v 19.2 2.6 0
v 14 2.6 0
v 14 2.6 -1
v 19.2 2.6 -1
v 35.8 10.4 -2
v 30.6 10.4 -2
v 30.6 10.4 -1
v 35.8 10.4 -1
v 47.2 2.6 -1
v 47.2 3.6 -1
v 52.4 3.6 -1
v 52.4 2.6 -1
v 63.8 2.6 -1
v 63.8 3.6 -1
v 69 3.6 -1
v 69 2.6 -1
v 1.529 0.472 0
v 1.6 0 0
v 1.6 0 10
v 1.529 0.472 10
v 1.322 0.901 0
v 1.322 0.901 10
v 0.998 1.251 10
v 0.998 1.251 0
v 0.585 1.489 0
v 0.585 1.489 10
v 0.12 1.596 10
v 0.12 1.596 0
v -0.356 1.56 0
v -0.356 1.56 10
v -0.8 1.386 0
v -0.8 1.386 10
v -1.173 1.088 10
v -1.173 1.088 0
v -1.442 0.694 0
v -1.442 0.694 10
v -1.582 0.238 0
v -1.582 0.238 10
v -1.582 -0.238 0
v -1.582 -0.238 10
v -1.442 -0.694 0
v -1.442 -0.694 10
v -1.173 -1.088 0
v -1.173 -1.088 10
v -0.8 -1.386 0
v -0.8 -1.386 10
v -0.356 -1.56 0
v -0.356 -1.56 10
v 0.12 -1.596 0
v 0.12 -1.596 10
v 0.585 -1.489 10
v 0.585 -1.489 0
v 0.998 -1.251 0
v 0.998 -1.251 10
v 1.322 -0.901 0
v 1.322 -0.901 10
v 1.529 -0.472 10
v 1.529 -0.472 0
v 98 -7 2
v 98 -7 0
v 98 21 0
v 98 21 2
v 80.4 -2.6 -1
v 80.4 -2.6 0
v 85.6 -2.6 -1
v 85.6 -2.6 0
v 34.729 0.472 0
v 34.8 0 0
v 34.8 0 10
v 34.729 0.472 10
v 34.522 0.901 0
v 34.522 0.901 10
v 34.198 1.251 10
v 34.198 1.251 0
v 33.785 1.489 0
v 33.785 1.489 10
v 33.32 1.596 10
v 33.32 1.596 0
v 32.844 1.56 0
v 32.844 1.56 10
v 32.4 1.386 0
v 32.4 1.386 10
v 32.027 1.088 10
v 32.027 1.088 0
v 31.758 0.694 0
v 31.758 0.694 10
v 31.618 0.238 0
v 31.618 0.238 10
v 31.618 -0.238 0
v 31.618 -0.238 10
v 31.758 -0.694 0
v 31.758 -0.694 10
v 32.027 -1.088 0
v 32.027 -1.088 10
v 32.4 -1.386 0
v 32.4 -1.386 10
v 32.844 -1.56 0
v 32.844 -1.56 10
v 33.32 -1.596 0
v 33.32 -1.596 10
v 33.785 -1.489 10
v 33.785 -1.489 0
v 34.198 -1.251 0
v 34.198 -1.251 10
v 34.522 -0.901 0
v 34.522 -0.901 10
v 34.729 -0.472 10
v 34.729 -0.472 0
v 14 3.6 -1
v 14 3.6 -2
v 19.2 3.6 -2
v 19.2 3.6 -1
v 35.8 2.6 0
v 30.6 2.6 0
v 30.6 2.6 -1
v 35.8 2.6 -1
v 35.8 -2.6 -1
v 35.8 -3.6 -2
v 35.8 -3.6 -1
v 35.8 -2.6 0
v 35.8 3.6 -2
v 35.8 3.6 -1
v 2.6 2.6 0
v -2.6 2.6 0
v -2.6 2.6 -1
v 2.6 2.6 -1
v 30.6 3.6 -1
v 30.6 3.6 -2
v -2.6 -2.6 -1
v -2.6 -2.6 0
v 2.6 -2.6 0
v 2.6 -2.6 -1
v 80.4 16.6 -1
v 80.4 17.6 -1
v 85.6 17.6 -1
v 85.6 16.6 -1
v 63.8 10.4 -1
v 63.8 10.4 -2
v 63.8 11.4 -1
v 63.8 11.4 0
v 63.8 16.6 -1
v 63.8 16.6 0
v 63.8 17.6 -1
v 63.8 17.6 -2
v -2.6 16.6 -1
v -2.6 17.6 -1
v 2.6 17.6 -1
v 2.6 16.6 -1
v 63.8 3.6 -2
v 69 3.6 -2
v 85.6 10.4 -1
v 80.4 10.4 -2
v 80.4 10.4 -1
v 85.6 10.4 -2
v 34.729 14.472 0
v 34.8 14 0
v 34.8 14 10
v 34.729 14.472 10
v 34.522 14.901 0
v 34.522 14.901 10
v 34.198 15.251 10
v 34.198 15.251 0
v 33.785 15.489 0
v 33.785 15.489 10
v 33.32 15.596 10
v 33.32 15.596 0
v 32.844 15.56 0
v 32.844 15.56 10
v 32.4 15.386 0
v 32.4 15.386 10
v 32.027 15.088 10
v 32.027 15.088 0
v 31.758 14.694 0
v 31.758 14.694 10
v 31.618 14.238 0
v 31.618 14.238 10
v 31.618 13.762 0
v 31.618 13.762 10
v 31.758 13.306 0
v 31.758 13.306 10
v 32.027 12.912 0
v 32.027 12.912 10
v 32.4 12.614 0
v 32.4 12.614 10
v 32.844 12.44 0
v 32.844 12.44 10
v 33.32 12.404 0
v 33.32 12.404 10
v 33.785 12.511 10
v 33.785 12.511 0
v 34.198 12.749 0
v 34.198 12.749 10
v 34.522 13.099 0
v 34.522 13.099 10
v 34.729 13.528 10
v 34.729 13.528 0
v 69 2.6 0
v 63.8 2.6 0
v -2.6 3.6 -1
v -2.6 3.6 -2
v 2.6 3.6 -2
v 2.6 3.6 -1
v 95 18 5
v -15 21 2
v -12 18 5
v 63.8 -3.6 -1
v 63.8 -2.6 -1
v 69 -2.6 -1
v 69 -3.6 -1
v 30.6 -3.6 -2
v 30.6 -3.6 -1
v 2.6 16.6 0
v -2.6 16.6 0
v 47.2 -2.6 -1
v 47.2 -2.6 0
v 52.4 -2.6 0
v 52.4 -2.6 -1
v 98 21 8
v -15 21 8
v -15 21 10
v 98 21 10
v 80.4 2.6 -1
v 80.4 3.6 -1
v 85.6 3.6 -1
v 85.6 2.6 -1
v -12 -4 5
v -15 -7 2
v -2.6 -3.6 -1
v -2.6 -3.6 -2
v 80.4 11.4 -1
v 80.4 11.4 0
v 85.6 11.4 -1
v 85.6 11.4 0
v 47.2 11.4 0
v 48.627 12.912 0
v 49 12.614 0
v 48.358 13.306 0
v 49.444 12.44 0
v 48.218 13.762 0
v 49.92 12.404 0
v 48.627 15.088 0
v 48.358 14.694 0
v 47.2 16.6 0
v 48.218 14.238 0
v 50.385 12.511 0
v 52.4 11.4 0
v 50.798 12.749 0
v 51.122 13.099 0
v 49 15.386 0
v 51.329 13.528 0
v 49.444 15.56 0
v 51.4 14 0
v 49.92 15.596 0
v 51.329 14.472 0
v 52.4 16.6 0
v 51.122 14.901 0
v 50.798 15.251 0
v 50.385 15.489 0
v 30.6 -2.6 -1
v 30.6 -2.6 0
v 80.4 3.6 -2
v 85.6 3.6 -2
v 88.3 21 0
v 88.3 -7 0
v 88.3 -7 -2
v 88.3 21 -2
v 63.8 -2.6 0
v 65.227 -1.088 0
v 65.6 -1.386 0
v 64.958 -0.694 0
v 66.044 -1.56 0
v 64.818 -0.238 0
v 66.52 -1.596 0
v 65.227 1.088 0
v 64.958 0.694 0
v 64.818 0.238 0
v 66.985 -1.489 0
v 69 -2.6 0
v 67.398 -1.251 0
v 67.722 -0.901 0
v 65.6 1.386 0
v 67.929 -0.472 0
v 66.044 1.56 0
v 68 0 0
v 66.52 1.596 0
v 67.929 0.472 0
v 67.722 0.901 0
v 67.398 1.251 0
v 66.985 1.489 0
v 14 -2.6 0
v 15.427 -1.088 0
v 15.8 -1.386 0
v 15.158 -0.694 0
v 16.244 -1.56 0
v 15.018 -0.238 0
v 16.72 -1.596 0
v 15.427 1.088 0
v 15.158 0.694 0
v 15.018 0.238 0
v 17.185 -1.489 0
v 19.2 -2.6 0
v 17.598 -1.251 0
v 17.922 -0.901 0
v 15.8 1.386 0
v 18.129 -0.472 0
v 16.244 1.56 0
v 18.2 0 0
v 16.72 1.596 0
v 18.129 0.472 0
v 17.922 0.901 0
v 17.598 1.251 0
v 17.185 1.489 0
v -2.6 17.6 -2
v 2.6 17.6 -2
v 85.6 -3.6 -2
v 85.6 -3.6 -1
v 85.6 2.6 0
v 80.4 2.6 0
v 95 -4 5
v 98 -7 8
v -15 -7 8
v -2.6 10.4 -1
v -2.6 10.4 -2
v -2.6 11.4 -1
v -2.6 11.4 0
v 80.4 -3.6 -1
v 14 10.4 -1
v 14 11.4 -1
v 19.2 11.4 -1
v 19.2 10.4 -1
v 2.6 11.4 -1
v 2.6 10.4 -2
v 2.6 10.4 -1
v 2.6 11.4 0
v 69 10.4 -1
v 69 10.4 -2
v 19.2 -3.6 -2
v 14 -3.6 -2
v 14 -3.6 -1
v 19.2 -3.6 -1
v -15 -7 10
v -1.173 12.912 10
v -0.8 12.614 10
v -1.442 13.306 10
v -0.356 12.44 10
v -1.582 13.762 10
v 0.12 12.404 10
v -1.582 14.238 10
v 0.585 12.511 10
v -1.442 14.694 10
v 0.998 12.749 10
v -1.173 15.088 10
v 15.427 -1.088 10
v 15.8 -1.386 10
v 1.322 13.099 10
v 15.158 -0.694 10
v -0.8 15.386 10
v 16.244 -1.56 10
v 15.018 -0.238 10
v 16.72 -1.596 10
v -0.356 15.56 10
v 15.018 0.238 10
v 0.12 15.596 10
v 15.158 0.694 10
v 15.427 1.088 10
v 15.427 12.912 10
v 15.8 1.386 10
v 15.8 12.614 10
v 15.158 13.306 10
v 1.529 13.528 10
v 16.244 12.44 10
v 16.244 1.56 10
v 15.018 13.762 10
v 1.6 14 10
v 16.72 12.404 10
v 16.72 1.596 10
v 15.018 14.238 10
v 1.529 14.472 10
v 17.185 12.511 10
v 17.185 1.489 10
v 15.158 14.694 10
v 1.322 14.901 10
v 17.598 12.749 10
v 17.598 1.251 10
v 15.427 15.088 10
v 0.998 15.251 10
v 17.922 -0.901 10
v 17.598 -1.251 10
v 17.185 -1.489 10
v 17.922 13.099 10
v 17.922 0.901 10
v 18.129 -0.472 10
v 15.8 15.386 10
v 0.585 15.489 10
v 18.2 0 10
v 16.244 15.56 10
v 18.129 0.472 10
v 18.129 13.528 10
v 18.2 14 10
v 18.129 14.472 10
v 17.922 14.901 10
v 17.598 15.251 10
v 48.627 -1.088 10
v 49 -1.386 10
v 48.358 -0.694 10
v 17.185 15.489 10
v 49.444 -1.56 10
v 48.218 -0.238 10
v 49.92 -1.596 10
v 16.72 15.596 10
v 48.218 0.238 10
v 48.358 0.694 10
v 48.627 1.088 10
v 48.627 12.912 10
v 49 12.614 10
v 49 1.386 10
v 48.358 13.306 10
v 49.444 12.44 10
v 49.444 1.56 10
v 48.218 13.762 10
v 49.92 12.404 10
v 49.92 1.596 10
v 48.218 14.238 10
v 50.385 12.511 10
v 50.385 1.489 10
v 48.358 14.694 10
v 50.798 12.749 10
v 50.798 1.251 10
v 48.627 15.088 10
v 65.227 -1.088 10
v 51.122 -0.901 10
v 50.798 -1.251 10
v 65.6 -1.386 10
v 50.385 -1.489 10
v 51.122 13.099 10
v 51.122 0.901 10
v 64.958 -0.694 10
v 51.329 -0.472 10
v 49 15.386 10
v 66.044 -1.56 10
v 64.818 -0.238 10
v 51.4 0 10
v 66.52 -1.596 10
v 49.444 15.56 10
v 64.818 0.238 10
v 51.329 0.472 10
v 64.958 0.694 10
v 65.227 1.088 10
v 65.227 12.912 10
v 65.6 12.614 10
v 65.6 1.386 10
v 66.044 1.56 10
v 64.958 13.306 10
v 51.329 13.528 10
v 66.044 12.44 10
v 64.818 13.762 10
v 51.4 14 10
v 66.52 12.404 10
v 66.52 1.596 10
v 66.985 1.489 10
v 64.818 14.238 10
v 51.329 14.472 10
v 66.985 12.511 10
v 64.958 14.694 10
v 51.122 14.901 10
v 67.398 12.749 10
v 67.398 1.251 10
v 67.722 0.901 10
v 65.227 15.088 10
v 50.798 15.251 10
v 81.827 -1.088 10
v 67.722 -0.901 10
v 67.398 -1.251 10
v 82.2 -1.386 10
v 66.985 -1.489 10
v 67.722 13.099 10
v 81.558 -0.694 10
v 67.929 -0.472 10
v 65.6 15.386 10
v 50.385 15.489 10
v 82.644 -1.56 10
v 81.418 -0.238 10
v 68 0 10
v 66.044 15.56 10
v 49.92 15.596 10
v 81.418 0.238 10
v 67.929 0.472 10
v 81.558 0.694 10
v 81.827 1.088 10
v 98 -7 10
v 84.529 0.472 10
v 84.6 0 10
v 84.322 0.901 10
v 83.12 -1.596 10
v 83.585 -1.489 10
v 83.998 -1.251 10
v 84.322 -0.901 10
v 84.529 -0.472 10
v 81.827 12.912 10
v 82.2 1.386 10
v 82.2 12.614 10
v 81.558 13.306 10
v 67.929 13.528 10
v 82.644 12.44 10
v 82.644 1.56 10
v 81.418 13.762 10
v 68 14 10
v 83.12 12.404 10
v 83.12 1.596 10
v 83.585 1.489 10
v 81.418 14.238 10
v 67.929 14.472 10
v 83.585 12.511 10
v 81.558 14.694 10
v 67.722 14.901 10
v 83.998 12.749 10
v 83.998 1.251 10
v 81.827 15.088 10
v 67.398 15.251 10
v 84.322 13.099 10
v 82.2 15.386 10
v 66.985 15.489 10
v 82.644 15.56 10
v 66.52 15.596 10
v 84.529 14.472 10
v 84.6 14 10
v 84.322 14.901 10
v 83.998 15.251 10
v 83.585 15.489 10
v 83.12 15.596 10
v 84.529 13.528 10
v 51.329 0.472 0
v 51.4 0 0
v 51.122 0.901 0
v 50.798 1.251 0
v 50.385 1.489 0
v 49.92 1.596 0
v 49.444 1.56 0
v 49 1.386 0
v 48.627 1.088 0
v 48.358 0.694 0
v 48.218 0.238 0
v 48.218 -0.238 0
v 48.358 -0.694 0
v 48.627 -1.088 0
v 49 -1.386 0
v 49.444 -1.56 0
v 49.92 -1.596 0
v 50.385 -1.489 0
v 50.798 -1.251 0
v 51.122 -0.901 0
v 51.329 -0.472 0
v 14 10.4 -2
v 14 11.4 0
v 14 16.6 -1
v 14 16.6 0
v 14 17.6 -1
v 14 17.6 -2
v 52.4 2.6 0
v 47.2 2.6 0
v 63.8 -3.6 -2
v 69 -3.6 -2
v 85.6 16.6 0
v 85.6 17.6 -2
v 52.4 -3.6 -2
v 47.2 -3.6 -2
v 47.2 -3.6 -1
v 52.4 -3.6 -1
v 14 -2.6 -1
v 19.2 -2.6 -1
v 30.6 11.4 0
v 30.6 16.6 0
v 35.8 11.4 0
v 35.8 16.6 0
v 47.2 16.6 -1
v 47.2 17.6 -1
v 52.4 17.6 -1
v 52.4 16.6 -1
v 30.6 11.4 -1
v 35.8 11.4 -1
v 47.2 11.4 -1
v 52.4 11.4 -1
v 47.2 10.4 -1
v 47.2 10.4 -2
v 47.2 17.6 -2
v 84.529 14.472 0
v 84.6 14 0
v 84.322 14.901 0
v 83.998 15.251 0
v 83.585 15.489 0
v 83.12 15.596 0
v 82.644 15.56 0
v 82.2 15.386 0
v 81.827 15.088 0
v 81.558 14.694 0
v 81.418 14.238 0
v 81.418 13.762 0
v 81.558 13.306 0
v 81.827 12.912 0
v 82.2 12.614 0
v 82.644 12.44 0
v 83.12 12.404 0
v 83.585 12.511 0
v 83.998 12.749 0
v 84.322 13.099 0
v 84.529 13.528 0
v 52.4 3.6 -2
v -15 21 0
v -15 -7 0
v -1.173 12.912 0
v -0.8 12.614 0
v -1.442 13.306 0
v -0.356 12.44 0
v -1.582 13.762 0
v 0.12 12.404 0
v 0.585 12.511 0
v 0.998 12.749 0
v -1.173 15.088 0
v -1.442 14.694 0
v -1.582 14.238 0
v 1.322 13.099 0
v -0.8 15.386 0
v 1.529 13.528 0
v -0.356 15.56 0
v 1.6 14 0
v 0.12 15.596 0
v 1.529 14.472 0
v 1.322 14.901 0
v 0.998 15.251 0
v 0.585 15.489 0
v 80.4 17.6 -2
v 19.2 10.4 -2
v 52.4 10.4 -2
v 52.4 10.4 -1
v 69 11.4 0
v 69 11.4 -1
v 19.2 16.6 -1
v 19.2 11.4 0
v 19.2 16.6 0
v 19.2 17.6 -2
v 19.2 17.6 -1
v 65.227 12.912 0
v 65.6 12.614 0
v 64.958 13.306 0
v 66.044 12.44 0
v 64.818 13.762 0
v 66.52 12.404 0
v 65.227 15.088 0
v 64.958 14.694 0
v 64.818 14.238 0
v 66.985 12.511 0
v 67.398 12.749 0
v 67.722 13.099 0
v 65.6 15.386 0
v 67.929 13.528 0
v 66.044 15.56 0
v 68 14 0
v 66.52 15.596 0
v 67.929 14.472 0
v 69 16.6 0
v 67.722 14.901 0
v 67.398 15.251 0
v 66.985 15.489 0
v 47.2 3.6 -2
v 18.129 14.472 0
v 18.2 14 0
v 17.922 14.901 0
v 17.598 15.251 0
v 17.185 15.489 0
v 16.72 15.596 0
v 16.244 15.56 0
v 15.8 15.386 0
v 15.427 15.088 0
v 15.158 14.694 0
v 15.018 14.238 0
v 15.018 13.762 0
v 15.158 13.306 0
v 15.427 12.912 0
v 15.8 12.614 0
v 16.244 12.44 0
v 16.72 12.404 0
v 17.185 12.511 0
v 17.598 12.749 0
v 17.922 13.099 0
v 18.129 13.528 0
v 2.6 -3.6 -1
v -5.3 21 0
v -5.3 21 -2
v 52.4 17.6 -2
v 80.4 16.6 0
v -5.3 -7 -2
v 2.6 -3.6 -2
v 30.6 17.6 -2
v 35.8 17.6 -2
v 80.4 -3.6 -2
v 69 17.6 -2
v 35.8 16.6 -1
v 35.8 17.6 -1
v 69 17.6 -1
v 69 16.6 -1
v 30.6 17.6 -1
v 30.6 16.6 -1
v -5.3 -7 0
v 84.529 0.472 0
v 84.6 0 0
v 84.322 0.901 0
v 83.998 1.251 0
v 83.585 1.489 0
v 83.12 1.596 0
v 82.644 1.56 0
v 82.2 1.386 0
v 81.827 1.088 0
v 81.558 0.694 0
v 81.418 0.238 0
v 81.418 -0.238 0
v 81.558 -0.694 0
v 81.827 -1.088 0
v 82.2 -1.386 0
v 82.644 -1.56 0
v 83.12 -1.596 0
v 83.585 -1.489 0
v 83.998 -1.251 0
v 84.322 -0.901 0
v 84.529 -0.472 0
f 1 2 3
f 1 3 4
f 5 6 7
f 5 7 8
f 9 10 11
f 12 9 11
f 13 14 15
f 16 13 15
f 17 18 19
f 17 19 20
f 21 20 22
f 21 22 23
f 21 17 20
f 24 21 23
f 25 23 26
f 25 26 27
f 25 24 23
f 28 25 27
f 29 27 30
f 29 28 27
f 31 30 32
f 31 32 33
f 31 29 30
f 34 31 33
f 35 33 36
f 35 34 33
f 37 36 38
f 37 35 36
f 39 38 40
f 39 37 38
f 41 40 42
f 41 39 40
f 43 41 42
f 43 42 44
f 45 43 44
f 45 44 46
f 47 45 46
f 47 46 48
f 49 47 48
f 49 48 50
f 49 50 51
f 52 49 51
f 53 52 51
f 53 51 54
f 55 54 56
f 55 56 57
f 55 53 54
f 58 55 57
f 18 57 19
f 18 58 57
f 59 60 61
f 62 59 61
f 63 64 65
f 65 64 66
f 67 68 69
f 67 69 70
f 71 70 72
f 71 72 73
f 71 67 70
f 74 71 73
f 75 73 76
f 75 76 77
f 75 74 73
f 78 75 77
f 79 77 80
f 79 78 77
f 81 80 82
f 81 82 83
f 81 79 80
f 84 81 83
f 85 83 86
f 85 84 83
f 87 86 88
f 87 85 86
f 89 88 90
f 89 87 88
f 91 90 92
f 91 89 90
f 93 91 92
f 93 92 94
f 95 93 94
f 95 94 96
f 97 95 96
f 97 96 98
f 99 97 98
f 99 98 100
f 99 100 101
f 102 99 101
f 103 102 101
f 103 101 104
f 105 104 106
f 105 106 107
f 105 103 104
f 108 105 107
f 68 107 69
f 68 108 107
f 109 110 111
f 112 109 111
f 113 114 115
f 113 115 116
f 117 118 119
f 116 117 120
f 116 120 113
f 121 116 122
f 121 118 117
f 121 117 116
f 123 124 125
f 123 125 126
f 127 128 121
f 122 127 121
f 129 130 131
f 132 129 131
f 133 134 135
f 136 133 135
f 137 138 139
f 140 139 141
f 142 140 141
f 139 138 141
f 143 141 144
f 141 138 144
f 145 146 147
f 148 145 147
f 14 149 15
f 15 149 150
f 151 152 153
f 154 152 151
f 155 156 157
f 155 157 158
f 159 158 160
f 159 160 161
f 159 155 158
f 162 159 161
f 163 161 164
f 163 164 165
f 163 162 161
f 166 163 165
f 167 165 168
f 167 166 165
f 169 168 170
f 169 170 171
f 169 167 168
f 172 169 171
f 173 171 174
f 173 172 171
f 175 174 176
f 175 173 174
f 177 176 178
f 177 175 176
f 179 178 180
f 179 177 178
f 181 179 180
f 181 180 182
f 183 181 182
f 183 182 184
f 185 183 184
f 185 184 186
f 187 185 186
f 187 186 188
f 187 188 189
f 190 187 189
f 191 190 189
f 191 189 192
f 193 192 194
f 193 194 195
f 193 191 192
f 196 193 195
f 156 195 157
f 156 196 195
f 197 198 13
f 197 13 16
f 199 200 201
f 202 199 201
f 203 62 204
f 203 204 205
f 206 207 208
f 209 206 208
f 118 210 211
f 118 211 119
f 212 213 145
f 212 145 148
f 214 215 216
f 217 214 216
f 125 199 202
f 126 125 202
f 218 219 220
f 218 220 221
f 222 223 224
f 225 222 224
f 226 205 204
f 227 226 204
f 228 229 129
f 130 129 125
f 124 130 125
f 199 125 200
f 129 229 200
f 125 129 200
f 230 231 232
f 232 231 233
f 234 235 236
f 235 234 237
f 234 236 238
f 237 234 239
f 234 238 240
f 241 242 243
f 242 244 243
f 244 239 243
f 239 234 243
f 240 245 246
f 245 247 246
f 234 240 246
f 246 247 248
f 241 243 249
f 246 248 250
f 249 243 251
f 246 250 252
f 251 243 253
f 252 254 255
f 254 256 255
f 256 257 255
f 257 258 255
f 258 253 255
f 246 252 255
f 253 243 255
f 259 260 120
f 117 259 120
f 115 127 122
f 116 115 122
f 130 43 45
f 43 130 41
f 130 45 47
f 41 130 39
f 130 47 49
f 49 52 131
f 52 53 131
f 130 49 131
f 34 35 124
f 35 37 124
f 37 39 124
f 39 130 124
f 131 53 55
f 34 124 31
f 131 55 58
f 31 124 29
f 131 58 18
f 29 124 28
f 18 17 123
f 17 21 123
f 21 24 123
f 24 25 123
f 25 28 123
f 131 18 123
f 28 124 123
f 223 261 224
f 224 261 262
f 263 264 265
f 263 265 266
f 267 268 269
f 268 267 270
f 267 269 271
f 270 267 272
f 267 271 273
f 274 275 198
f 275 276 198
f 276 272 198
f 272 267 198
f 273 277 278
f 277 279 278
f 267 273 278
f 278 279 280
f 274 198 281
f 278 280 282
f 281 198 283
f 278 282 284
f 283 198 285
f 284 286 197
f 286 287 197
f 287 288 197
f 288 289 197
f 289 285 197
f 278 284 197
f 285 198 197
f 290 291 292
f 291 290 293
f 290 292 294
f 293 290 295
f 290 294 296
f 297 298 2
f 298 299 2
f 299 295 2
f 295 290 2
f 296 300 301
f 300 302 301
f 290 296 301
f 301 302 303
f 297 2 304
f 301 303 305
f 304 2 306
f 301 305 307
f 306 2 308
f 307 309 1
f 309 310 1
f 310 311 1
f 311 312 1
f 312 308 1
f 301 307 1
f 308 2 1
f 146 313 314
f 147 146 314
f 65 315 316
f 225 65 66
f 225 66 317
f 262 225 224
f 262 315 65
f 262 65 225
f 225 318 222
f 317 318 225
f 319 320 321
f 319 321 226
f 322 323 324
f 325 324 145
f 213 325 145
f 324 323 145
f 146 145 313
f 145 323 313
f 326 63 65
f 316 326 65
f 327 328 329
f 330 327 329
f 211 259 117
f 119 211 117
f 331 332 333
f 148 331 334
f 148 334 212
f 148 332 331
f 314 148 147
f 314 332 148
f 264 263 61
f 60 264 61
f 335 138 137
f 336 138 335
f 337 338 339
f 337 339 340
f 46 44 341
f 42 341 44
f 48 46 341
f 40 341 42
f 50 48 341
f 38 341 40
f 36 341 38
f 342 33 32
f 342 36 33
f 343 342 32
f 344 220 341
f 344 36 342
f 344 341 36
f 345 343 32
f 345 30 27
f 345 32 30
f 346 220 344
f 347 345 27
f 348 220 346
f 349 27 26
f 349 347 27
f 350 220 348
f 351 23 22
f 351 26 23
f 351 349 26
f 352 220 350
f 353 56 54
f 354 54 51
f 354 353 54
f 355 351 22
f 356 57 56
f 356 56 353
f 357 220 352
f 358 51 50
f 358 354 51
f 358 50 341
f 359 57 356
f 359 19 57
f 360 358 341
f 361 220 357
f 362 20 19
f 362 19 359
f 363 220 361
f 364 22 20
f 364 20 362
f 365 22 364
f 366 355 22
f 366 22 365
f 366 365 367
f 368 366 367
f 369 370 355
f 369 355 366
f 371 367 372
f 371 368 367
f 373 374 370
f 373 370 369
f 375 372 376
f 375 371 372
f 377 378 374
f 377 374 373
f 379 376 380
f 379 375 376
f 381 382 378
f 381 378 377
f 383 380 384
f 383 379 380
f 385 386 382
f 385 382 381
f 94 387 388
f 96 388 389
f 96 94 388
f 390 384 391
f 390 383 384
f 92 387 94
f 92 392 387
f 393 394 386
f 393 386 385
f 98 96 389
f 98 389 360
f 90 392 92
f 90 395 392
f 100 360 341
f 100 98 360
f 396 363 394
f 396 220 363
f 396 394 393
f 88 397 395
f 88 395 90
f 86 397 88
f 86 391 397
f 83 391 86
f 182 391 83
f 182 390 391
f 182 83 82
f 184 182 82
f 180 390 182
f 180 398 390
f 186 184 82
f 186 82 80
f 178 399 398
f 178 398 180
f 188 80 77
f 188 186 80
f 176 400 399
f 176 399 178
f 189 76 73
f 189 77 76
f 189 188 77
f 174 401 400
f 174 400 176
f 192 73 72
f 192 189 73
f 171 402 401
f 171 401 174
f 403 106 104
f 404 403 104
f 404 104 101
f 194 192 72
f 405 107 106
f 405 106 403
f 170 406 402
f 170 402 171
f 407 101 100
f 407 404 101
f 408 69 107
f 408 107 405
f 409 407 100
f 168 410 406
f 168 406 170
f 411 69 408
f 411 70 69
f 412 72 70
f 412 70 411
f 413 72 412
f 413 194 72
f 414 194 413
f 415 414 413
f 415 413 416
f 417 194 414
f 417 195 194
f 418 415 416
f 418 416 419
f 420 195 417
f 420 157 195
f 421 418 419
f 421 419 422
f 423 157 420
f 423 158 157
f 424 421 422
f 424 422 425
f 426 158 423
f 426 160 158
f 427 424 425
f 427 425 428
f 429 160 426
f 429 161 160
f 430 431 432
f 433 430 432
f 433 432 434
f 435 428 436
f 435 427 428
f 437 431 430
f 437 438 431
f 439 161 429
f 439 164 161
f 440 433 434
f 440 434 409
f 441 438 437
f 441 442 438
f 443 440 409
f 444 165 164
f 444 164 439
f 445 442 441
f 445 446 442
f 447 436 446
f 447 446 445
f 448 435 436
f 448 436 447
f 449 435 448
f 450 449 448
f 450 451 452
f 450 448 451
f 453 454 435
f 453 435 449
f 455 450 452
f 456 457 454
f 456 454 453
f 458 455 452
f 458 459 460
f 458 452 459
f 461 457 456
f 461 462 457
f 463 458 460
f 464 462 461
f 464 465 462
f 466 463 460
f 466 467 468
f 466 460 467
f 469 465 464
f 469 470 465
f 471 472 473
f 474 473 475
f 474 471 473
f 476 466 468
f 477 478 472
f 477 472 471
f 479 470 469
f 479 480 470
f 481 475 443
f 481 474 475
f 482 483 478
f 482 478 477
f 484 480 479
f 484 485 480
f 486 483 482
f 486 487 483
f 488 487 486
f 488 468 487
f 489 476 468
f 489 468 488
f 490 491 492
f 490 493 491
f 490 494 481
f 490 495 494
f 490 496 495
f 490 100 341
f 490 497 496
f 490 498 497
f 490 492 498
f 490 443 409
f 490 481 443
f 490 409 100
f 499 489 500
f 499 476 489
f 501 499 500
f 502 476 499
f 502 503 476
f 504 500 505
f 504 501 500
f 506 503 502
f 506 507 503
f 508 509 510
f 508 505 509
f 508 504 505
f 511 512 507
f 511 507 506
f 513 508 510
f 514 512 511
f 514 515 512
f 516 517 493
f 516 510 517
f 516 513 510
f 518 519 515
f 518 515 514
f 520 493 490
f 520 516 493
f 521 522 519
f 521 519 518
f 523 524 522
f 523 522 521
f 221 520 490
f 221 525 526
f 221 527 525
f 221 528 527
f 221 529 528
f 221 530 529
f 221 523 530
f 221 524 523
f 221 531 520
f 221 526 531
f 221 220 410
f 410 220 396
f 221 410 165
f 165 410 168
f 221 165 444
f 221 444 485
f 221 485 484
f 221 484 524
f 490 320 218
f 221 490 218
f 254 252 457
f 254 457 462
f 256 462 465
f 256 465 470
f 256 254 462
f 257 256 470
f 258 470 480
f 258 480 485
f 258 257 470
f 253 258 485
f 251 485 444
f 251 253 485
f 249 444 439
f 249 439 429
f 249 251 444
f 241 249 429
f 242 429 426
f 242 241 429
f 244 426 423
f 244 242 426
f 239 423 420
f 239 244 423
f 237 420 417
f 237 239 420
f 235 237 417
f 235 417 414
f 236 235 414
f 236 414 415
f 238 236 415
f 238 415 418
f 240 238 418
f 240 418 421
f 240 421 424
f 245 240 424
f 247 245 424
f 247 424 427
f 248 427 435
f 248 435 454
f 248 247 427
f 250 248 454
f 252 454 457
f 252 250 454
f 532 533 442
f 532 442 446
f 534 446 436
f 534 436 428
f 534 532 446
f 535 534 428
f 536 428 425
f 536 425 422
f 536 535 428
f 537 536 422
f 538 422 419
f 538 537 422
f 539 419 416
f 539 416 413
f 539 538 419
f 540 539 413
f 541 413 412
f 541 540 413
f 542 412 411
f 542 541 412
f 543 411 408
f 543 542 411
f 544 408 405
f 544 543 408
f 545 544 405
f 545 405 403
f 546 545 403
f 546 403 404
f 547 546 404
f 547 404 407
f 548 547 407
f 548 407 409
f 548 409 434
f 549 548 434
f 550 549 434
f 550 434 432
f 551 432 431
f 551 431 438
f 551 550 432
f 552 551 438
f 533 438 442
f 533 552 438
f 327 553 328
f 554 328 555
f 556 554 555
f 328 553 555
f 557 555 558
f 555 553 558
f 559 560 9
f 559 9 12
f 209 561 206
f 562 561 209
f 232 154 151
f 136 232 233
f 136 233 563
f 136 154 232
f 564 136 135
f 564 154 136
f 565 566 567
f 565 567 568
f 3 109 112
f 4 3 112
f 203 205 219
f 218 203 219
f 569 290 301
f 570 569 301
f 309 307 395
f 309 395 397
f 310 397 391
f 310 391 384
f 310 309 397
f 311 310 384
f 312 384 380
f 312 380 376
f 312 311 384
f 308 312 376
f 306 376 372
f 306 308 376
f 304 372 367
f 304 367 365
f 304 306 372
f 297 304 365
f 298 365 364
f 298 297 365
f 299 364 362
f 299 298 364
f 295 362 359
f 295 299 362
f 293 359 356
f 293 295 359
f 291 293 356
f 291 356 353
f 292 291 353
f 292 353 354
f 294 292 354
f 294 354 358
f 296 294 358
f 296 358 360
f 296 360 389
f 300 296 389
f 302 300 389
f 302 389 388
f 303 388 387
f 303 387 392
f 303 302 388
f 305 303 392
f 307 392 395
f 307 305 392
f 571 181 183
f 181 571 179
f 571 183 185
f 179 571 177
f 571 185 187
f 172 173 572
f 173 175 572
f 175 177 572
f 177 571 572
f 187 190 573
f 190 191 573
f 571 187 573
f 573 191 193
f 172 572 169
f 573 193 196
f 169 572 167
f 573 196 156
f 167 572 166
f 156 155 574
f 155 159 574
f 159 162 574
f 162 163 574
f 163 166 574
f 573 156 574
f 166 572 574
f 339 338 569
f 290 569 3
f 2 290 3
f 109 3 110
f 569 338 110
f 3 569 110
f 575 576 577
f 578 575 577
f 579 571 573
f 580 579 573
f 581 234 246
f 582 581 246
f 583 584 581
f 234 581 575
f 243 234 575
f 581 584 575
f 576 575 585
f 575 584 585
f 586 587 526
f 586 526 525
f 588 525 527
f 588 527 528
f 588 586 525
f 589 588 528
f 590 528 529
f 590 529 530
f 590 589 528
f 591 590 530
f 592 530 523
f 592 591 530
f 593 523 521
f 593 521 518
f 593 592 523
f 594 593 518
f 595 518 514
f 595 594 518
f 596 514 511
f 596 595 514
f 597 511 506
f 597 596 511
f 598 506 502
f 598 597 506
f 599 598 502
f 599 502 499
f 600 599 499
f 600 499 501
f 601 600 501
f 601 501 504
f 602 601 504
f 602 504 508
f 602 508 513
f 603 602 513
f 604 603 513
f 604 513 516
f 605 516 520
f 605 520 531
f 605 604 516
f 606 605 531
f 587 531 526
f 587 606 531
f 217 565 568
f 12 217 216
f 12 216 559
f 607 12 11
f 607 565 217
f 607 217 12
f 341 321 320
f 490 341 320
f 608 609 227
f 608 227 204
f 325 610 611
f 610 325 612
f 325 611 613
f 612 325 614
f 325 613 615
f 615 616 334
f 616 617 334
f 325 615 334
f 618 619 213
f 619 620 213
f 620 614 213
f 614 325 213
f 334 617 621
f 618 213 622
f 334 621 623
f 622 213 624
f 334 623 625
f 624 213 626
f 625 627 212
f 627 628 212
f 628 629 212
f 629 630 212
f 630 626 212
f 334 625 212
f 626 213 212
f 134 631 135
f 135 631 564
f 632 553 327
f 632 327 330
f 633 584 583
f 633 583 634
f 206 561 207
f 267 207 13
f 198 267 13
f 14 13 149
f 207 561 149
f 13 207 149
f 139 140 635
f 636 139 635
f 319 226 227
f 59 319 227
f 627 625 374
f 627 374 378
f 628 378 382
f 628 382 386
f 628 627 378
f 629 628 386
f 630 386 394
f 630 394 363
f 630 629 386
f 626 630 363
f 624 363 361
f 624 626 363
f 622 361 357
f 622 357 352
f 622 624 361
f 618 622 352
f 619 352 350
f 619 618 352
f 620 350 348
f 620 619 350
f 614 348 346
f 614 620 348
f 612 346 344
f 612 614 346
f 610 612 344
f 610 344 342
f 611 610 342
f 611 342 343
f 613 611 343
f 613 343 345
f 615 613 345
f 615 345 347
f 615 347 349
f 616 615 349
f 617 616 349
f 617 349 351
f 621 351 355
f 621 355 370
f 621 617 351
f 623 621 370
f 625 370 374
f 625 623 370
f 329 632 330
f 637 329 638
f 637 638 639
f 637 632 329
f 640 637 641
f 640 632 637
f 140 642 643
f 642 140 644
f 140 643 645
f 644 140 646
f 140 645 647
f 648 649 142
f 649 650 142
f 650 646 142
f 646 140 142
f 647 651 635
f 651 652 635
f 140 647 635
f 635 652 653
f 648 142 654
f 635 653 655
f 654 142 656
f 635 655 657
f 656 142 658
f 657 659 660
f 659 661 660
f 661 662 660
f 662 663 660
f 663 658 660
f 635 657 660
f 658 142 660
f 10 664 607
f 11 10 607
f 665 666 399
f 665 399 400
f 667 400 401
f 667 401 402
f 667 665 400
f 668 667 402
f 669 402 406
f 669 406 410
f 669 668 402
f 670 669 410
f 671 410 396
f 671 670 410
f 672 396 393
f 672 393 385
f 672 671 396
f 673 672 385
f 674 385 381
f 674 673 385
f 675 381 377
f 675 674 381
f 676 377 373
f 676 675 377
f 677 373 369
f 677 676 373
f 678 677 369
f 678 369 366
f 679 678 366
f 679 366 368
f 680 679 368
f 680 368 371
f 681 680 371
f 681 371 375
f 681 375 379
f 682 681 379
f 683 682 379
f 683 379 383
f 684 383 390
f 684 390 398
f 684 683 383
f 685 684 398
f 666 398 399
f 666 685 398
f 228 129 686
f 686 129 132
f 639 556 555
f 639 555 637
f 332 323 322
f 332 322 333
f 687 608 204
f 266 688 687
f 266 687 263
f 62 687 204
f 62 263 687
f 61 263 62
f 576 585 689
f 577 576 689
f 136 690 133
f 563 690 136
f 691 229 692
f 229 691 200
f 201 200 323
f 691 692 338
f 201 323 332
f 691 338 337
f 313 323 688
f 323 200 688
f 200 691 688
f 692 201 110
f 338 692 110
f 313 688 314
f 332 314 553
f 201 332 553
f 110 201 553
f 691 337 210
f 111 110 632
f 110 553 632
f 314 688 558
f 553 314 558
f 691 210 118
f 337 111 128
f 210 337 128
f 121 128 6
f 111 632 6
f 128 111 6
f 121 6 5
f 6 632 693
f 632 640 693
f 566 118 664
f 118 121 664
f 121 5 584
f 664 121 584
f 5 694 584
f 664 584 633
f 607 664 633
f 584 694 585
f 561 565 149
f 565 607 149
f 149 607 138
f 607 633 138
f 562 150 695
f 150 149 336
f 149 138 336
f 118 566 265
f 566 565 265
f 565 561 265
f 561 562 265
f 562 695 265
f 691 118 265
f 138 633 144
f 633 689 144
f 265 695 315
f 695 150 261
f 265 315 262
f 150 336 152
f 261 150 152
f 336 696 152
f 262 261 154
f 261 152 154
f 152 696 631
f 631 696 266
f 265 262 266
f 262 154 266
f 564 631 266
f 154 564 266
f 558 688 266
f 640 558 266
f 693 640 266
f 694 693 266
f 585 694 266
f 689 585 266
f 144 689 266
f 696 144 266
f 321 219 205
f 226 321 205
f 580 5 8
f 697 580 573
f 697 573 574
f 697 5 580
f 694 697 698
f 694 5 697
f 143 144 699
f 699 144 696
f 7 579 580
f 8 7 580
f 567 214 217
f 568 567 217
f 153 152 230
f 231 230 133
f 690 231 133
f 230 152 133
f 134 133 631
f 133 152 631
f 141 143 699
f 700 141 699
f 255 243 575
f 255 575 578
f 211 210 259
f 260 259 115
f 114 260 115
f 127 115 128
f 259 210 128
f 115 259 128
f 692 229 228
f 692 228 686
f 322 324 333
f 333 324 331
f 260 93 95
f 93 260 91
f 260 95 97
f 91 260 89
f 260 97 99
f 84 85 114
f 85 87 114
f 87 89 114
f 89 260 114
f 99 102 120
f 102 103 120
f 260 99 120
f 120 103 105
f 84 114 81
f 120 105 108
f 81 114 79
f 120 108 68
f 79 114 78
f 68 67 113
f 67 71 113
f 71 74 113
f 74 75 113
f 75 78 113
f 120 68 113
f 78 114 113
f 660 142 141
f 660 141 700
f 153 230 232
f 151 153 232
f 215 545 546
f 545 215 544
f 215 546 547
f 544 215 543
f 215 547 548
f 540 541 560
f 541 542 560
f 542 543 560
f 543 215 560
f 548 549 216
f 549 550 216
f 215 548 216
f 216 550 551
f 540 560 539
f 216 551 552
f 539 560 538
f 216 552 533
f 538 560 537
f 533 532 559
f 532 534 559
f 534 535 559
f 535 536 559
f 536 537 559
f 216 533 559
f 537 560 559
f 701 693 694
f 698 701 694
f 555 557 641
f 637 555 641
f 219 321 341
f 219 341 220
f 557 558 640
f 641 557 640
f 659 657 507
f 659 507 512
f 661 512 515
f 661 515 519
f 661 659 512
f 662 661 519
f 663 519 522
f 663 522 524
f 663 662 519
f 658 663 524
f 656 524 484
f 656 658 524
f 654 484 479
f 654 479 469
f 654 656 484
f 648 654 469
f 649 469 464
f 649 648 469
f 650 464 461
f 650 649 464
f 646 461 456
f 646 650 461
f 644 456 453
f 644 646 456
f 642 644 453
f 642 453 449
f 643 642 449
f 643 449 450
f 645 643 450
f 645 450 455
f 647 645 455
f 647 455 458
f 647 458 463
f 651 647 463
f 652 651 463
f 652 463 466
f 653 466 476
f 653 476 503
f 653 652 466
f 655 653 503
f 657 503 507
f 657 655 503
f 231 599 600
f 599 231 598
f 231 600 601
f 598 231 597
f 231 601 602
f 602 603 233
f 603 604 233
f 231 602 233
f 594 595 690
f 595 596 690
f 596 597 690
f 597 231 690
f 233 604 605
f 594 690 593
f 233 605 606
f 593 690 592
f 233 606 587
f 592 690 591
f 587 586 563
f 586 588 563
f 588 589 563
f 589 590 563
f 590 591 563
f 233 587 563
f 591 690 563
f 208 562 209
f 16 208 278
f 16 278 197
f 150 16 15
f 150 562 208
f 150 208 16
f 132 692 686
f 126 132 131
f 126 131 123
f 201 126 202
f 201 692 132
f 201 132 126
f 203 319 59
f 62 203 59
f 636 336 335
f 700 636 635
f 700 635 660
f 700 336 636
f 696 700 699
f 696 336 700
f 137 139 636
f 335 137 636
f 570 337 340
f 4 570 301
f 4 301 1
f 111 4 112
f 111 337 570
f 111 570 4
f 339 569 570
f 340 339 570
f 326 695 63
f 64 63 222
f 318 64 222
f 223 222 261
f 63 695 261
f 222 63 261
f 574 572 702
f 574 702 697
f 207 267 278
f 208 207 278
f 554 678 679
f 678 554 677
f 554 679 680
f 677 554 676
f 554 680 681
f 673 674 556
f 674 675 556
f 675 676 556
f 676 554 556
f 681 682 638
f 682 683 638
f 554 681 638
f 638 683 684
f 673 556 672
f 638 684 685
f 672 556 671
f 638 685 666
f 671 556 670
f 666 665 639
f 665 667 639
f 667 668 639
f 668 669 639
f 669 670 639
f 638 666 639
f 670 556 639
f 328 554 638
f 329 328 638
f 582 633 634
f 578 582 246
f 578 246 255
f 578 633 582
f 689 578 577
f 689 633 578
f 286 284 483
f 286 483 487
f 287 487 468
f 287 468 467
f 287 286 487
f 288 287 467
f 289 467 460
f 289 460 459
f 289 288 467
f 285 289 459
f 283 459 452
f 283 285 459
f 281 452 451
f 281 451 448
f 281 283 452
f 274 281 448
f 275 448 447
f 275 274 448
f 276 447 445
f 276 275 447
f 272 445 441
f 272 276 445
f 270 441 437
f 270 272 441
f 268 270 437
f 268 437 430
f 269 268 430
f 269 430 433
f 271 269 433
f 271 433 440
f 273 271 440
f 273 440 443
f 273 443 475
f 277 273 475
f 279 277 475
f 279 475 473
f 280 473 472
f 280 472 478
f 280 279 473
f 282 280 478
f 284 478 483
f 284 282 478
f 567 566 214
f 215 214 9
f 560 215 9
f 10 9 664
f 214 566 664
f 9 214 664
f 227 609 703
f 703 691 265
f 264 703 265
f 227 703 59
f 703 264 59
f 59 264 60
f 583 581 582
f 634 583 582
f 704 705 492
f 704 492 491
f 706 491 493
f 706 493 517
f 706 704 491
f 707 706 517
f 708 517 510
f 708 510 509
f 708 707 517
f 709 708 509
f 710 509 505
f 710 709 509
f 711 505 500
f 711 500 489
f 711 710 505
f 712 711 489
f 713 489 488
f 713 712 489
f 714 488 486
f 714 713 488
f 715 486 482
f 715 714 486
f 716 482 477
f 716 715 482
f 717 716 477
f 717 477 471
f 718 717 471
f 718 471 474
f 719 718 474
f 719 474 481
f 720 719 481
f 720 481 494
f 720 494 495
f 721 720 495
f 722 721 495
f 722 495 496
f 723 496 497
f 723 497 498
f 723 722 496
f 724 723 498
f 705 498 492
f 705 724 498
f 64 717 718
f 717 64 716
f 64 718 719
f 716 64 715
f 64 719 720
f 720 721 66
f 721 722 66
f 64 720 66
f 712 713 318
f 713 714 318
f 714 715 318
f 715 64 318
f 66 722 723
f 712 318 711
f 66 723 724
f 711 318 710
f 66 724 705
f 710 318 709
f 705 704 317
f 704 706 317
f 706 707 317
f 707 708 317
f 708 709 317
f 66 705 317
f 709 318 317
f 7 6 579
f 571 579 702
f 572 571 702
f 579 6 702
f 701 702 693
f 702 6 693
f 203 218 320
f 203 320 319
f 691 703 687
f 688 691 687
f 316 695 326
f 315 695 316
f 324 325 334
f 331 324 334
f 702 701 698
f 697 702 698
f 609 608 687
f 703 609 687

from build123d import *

# Parameters (mm, degrees)
SKETCH_W        = 113
SKETCH_H        = 28
SKETCH_R        = 1.6
PAD_DEPTH       = 10
SKETCH001_W     = 93.6
SKETCH001_H     = 28
SKETCH001_W_2   = 5.2
SKETCH001_H_2   = 5.2
PAD001_DEPTH    = 2
POCKET_DEPTH    = 113.001
SKETCH003_W     = 5.2
SKETCH003_H     = 7.2
POCKET001_DEPTH = 1
POCKET002_DEPTH = 28.001


with BuildPart() as part:
    # Sketch → Pad (new body)
    with BuildSketch(Plane.XY):
        with Locations((41.5, 7)):
            Rectangle(SKETCH_W, SKETCH_H)
        Circle(SKETCH_R, mode=Mode.SUBTRACT)
        with Locations((0, 14)):
            Circle(SKETCH_R, mode=Mode.SUBTRACT)
        with Locations((16.6, 0)):
            Circle(SKETCH_R, mode=Mode.SUBTRACT)
        with Locations((16.6, 14)):
            Circle(SKETCH_R, mode=Mode.SUBTRACT)
        with Locations((33.2, 0)):
            Circle(SKETCH_R, mode=Mode.SUBTRACT)
        with Locations((33.2, 14)):
            Circle(SKETCH_R, mode=Mode.SUBTRACT)
        with Locations((49.8, 0)):
            Circle(SKETCH_R, mode=Mode.SUBTRACT)
        with Locations((49.8, 14)):
            Circle(SKETCH_R, mode=Mode.SUBTRACT)
        with Locations((66.4, 0)):
            Circle(SKETCH_R, mode=Mode.SUBTRACT)
        with Locations((66.4, 14)):
            Circle(SKETCH_R, mode=Mode.SUBTRACT)
        with Locations((83, 0)):
            Circle(SKETCH_R, mode=Mode.SUBTRACT)
        with Locations((83, 14)):
            Circle(SKETCH_R, mode=Mode.SUBTRACT)
    extrude(amount=PAD_DEPTH)

    # Sketch001 → Pad001 (join)
    with BuildSketch(Plane.XY):
        with Locations((41.5, 7)):
            Rectangle(SKETCH001_W, SKETCH001_H)
        Rectangle(SKETCH001_W_2, SKETCH001_H_2, mode=Mode.SUBTRACT)
        with Locations((0, 14)):
            Rectangle(SKETCH001_W_2, SKETCH001_H_2, mode=Mode.SUBTRACT)
        with Locations((16.6, 0)):
            Rectangle(SKETCH001_W_2, SKETCH001_H_2, mode=Mode.SUBTRACT)
        with Locations((16.6, 14)):
            Rectangle(SKETCH001_W_2, SKETCH001_H_2, mode=Mode.SUBTRACT)
        with Locations((33.2, 0)):
            Rectangle(SKETCH001_W_2, SKETCH001_H_2, mode=Mode.SUBTRACT)
        with Locations((33.2, 14)):
            Rectangle(SKETCH001_W_2, SKETCH001_H_2, mode=Mode.SUBTRACT)
        with Locations((49.8, 0)):
            Rectangle(SKETCH001_W_2, SKETCH001_H_2, mode=Mode.SUBTRACT)
        with Locations((49.8, 14)):
            Rectangle(SKETCH001_W_2, SKETCH001_H_2, mode=Mode.SUBTRACT)
        with Locations((66.4, 0)):
            Rectangle(SKETCH001_W_2, SKETCH001_H_2, mode=Mode.SUBTRACT)
        with Locations((66.4, 14)):
            Rectangle(SKETCH001_W_2, SKETCH001_H_2, mode=Mode.SUBTRACT)
        with Locations((83, 0)):
            Rectangle(SKETCH001_W_2, SKETCH001_H_2, mode=Mode.SUBTRACT)
        with Locations((83, 14)):
            Rectangle(SKETCH001_W_2, SKETCH001_H_2, mode=Mode.SUBTRACT)
    extrude(amount=-PAD001_DEPTH)

    # Sketch002 (on Face2 of Pad001) → Pocket (cut, through all)
    with BuildSketch(Plane(origin=(-15, 0, 0), x_dir=(0, -1, 0), z_dir=(-1, 0, 0))):
        Polygon((-21, 8), (-21, 2), (-18, 5), align=None)
        Polygon((7, 2), (7, 8), (4, 5), align=None)
    extrude(amount=-POCKET_DEPTH, mode=Mode.SUBTRACT)

    # Sketch003 → Pocket001 (cut)
    with BuildSketch(Plane.XY.offset(-2)):
        Rectangle(SKETCH003_W, SKETCH003_H)
        with Locations((0, 14)):
            Rectangle(SKETCH003_W, SKETCH003_H)
        with Locations((16.6, 0)):
            Rectangle(SKETCH003_W, SKETCH003_H)
        with Locations((16.6, 14)):
            Rectangle(SKETCH003_W, SKETCH003_H)
        with Locations((33.2, 0)):
            Rectangle(SKETCH003_W, SKETCH003_H)
        with Locations((33.2, 14)):
            Rectangle(SKETCH003_W, SKETCH003_H)
        with Locations((49.8, 0)):
            Rectangle(SKETCH003_W, SKETCH003_H)
        with Locations((49.8, 14)):
            Rectangle(SKETCH003_W, SKETCH003_H)
        with Locations((66.4, 0)):
            Rectangle(SKETCH003_W, SKETCH003_H)
        with Locations((66.4, 14)):
            Rectangle(SKETCH003_W, SKETCH003_H)
        with Locations((83, 0)):
            Rectangle(SKETCH003_W, SKETCH003_H)
        with Locations((83, 14)):
            Rectangle(SKETCH003_W, SKETCH003_H)
    extrude(amount=POCKET001_DEPTH, mode=Mode.SUBTRACT)

    # Sketch004 (on Face16 of Pocket001) → Pocket002 (cut, through all)
    with BuildSketch(Plane.XZ.offset(7)):
        Polygon((98, 8), (95, 5), (98, 2), align=None)
        Polygon((-15, 8), (-12, 5), (-15, 2), align=None)
    extrude(amount=-POCKET002_DEPTH, mode=Mode.SUBTRACT)


solid = part.part
